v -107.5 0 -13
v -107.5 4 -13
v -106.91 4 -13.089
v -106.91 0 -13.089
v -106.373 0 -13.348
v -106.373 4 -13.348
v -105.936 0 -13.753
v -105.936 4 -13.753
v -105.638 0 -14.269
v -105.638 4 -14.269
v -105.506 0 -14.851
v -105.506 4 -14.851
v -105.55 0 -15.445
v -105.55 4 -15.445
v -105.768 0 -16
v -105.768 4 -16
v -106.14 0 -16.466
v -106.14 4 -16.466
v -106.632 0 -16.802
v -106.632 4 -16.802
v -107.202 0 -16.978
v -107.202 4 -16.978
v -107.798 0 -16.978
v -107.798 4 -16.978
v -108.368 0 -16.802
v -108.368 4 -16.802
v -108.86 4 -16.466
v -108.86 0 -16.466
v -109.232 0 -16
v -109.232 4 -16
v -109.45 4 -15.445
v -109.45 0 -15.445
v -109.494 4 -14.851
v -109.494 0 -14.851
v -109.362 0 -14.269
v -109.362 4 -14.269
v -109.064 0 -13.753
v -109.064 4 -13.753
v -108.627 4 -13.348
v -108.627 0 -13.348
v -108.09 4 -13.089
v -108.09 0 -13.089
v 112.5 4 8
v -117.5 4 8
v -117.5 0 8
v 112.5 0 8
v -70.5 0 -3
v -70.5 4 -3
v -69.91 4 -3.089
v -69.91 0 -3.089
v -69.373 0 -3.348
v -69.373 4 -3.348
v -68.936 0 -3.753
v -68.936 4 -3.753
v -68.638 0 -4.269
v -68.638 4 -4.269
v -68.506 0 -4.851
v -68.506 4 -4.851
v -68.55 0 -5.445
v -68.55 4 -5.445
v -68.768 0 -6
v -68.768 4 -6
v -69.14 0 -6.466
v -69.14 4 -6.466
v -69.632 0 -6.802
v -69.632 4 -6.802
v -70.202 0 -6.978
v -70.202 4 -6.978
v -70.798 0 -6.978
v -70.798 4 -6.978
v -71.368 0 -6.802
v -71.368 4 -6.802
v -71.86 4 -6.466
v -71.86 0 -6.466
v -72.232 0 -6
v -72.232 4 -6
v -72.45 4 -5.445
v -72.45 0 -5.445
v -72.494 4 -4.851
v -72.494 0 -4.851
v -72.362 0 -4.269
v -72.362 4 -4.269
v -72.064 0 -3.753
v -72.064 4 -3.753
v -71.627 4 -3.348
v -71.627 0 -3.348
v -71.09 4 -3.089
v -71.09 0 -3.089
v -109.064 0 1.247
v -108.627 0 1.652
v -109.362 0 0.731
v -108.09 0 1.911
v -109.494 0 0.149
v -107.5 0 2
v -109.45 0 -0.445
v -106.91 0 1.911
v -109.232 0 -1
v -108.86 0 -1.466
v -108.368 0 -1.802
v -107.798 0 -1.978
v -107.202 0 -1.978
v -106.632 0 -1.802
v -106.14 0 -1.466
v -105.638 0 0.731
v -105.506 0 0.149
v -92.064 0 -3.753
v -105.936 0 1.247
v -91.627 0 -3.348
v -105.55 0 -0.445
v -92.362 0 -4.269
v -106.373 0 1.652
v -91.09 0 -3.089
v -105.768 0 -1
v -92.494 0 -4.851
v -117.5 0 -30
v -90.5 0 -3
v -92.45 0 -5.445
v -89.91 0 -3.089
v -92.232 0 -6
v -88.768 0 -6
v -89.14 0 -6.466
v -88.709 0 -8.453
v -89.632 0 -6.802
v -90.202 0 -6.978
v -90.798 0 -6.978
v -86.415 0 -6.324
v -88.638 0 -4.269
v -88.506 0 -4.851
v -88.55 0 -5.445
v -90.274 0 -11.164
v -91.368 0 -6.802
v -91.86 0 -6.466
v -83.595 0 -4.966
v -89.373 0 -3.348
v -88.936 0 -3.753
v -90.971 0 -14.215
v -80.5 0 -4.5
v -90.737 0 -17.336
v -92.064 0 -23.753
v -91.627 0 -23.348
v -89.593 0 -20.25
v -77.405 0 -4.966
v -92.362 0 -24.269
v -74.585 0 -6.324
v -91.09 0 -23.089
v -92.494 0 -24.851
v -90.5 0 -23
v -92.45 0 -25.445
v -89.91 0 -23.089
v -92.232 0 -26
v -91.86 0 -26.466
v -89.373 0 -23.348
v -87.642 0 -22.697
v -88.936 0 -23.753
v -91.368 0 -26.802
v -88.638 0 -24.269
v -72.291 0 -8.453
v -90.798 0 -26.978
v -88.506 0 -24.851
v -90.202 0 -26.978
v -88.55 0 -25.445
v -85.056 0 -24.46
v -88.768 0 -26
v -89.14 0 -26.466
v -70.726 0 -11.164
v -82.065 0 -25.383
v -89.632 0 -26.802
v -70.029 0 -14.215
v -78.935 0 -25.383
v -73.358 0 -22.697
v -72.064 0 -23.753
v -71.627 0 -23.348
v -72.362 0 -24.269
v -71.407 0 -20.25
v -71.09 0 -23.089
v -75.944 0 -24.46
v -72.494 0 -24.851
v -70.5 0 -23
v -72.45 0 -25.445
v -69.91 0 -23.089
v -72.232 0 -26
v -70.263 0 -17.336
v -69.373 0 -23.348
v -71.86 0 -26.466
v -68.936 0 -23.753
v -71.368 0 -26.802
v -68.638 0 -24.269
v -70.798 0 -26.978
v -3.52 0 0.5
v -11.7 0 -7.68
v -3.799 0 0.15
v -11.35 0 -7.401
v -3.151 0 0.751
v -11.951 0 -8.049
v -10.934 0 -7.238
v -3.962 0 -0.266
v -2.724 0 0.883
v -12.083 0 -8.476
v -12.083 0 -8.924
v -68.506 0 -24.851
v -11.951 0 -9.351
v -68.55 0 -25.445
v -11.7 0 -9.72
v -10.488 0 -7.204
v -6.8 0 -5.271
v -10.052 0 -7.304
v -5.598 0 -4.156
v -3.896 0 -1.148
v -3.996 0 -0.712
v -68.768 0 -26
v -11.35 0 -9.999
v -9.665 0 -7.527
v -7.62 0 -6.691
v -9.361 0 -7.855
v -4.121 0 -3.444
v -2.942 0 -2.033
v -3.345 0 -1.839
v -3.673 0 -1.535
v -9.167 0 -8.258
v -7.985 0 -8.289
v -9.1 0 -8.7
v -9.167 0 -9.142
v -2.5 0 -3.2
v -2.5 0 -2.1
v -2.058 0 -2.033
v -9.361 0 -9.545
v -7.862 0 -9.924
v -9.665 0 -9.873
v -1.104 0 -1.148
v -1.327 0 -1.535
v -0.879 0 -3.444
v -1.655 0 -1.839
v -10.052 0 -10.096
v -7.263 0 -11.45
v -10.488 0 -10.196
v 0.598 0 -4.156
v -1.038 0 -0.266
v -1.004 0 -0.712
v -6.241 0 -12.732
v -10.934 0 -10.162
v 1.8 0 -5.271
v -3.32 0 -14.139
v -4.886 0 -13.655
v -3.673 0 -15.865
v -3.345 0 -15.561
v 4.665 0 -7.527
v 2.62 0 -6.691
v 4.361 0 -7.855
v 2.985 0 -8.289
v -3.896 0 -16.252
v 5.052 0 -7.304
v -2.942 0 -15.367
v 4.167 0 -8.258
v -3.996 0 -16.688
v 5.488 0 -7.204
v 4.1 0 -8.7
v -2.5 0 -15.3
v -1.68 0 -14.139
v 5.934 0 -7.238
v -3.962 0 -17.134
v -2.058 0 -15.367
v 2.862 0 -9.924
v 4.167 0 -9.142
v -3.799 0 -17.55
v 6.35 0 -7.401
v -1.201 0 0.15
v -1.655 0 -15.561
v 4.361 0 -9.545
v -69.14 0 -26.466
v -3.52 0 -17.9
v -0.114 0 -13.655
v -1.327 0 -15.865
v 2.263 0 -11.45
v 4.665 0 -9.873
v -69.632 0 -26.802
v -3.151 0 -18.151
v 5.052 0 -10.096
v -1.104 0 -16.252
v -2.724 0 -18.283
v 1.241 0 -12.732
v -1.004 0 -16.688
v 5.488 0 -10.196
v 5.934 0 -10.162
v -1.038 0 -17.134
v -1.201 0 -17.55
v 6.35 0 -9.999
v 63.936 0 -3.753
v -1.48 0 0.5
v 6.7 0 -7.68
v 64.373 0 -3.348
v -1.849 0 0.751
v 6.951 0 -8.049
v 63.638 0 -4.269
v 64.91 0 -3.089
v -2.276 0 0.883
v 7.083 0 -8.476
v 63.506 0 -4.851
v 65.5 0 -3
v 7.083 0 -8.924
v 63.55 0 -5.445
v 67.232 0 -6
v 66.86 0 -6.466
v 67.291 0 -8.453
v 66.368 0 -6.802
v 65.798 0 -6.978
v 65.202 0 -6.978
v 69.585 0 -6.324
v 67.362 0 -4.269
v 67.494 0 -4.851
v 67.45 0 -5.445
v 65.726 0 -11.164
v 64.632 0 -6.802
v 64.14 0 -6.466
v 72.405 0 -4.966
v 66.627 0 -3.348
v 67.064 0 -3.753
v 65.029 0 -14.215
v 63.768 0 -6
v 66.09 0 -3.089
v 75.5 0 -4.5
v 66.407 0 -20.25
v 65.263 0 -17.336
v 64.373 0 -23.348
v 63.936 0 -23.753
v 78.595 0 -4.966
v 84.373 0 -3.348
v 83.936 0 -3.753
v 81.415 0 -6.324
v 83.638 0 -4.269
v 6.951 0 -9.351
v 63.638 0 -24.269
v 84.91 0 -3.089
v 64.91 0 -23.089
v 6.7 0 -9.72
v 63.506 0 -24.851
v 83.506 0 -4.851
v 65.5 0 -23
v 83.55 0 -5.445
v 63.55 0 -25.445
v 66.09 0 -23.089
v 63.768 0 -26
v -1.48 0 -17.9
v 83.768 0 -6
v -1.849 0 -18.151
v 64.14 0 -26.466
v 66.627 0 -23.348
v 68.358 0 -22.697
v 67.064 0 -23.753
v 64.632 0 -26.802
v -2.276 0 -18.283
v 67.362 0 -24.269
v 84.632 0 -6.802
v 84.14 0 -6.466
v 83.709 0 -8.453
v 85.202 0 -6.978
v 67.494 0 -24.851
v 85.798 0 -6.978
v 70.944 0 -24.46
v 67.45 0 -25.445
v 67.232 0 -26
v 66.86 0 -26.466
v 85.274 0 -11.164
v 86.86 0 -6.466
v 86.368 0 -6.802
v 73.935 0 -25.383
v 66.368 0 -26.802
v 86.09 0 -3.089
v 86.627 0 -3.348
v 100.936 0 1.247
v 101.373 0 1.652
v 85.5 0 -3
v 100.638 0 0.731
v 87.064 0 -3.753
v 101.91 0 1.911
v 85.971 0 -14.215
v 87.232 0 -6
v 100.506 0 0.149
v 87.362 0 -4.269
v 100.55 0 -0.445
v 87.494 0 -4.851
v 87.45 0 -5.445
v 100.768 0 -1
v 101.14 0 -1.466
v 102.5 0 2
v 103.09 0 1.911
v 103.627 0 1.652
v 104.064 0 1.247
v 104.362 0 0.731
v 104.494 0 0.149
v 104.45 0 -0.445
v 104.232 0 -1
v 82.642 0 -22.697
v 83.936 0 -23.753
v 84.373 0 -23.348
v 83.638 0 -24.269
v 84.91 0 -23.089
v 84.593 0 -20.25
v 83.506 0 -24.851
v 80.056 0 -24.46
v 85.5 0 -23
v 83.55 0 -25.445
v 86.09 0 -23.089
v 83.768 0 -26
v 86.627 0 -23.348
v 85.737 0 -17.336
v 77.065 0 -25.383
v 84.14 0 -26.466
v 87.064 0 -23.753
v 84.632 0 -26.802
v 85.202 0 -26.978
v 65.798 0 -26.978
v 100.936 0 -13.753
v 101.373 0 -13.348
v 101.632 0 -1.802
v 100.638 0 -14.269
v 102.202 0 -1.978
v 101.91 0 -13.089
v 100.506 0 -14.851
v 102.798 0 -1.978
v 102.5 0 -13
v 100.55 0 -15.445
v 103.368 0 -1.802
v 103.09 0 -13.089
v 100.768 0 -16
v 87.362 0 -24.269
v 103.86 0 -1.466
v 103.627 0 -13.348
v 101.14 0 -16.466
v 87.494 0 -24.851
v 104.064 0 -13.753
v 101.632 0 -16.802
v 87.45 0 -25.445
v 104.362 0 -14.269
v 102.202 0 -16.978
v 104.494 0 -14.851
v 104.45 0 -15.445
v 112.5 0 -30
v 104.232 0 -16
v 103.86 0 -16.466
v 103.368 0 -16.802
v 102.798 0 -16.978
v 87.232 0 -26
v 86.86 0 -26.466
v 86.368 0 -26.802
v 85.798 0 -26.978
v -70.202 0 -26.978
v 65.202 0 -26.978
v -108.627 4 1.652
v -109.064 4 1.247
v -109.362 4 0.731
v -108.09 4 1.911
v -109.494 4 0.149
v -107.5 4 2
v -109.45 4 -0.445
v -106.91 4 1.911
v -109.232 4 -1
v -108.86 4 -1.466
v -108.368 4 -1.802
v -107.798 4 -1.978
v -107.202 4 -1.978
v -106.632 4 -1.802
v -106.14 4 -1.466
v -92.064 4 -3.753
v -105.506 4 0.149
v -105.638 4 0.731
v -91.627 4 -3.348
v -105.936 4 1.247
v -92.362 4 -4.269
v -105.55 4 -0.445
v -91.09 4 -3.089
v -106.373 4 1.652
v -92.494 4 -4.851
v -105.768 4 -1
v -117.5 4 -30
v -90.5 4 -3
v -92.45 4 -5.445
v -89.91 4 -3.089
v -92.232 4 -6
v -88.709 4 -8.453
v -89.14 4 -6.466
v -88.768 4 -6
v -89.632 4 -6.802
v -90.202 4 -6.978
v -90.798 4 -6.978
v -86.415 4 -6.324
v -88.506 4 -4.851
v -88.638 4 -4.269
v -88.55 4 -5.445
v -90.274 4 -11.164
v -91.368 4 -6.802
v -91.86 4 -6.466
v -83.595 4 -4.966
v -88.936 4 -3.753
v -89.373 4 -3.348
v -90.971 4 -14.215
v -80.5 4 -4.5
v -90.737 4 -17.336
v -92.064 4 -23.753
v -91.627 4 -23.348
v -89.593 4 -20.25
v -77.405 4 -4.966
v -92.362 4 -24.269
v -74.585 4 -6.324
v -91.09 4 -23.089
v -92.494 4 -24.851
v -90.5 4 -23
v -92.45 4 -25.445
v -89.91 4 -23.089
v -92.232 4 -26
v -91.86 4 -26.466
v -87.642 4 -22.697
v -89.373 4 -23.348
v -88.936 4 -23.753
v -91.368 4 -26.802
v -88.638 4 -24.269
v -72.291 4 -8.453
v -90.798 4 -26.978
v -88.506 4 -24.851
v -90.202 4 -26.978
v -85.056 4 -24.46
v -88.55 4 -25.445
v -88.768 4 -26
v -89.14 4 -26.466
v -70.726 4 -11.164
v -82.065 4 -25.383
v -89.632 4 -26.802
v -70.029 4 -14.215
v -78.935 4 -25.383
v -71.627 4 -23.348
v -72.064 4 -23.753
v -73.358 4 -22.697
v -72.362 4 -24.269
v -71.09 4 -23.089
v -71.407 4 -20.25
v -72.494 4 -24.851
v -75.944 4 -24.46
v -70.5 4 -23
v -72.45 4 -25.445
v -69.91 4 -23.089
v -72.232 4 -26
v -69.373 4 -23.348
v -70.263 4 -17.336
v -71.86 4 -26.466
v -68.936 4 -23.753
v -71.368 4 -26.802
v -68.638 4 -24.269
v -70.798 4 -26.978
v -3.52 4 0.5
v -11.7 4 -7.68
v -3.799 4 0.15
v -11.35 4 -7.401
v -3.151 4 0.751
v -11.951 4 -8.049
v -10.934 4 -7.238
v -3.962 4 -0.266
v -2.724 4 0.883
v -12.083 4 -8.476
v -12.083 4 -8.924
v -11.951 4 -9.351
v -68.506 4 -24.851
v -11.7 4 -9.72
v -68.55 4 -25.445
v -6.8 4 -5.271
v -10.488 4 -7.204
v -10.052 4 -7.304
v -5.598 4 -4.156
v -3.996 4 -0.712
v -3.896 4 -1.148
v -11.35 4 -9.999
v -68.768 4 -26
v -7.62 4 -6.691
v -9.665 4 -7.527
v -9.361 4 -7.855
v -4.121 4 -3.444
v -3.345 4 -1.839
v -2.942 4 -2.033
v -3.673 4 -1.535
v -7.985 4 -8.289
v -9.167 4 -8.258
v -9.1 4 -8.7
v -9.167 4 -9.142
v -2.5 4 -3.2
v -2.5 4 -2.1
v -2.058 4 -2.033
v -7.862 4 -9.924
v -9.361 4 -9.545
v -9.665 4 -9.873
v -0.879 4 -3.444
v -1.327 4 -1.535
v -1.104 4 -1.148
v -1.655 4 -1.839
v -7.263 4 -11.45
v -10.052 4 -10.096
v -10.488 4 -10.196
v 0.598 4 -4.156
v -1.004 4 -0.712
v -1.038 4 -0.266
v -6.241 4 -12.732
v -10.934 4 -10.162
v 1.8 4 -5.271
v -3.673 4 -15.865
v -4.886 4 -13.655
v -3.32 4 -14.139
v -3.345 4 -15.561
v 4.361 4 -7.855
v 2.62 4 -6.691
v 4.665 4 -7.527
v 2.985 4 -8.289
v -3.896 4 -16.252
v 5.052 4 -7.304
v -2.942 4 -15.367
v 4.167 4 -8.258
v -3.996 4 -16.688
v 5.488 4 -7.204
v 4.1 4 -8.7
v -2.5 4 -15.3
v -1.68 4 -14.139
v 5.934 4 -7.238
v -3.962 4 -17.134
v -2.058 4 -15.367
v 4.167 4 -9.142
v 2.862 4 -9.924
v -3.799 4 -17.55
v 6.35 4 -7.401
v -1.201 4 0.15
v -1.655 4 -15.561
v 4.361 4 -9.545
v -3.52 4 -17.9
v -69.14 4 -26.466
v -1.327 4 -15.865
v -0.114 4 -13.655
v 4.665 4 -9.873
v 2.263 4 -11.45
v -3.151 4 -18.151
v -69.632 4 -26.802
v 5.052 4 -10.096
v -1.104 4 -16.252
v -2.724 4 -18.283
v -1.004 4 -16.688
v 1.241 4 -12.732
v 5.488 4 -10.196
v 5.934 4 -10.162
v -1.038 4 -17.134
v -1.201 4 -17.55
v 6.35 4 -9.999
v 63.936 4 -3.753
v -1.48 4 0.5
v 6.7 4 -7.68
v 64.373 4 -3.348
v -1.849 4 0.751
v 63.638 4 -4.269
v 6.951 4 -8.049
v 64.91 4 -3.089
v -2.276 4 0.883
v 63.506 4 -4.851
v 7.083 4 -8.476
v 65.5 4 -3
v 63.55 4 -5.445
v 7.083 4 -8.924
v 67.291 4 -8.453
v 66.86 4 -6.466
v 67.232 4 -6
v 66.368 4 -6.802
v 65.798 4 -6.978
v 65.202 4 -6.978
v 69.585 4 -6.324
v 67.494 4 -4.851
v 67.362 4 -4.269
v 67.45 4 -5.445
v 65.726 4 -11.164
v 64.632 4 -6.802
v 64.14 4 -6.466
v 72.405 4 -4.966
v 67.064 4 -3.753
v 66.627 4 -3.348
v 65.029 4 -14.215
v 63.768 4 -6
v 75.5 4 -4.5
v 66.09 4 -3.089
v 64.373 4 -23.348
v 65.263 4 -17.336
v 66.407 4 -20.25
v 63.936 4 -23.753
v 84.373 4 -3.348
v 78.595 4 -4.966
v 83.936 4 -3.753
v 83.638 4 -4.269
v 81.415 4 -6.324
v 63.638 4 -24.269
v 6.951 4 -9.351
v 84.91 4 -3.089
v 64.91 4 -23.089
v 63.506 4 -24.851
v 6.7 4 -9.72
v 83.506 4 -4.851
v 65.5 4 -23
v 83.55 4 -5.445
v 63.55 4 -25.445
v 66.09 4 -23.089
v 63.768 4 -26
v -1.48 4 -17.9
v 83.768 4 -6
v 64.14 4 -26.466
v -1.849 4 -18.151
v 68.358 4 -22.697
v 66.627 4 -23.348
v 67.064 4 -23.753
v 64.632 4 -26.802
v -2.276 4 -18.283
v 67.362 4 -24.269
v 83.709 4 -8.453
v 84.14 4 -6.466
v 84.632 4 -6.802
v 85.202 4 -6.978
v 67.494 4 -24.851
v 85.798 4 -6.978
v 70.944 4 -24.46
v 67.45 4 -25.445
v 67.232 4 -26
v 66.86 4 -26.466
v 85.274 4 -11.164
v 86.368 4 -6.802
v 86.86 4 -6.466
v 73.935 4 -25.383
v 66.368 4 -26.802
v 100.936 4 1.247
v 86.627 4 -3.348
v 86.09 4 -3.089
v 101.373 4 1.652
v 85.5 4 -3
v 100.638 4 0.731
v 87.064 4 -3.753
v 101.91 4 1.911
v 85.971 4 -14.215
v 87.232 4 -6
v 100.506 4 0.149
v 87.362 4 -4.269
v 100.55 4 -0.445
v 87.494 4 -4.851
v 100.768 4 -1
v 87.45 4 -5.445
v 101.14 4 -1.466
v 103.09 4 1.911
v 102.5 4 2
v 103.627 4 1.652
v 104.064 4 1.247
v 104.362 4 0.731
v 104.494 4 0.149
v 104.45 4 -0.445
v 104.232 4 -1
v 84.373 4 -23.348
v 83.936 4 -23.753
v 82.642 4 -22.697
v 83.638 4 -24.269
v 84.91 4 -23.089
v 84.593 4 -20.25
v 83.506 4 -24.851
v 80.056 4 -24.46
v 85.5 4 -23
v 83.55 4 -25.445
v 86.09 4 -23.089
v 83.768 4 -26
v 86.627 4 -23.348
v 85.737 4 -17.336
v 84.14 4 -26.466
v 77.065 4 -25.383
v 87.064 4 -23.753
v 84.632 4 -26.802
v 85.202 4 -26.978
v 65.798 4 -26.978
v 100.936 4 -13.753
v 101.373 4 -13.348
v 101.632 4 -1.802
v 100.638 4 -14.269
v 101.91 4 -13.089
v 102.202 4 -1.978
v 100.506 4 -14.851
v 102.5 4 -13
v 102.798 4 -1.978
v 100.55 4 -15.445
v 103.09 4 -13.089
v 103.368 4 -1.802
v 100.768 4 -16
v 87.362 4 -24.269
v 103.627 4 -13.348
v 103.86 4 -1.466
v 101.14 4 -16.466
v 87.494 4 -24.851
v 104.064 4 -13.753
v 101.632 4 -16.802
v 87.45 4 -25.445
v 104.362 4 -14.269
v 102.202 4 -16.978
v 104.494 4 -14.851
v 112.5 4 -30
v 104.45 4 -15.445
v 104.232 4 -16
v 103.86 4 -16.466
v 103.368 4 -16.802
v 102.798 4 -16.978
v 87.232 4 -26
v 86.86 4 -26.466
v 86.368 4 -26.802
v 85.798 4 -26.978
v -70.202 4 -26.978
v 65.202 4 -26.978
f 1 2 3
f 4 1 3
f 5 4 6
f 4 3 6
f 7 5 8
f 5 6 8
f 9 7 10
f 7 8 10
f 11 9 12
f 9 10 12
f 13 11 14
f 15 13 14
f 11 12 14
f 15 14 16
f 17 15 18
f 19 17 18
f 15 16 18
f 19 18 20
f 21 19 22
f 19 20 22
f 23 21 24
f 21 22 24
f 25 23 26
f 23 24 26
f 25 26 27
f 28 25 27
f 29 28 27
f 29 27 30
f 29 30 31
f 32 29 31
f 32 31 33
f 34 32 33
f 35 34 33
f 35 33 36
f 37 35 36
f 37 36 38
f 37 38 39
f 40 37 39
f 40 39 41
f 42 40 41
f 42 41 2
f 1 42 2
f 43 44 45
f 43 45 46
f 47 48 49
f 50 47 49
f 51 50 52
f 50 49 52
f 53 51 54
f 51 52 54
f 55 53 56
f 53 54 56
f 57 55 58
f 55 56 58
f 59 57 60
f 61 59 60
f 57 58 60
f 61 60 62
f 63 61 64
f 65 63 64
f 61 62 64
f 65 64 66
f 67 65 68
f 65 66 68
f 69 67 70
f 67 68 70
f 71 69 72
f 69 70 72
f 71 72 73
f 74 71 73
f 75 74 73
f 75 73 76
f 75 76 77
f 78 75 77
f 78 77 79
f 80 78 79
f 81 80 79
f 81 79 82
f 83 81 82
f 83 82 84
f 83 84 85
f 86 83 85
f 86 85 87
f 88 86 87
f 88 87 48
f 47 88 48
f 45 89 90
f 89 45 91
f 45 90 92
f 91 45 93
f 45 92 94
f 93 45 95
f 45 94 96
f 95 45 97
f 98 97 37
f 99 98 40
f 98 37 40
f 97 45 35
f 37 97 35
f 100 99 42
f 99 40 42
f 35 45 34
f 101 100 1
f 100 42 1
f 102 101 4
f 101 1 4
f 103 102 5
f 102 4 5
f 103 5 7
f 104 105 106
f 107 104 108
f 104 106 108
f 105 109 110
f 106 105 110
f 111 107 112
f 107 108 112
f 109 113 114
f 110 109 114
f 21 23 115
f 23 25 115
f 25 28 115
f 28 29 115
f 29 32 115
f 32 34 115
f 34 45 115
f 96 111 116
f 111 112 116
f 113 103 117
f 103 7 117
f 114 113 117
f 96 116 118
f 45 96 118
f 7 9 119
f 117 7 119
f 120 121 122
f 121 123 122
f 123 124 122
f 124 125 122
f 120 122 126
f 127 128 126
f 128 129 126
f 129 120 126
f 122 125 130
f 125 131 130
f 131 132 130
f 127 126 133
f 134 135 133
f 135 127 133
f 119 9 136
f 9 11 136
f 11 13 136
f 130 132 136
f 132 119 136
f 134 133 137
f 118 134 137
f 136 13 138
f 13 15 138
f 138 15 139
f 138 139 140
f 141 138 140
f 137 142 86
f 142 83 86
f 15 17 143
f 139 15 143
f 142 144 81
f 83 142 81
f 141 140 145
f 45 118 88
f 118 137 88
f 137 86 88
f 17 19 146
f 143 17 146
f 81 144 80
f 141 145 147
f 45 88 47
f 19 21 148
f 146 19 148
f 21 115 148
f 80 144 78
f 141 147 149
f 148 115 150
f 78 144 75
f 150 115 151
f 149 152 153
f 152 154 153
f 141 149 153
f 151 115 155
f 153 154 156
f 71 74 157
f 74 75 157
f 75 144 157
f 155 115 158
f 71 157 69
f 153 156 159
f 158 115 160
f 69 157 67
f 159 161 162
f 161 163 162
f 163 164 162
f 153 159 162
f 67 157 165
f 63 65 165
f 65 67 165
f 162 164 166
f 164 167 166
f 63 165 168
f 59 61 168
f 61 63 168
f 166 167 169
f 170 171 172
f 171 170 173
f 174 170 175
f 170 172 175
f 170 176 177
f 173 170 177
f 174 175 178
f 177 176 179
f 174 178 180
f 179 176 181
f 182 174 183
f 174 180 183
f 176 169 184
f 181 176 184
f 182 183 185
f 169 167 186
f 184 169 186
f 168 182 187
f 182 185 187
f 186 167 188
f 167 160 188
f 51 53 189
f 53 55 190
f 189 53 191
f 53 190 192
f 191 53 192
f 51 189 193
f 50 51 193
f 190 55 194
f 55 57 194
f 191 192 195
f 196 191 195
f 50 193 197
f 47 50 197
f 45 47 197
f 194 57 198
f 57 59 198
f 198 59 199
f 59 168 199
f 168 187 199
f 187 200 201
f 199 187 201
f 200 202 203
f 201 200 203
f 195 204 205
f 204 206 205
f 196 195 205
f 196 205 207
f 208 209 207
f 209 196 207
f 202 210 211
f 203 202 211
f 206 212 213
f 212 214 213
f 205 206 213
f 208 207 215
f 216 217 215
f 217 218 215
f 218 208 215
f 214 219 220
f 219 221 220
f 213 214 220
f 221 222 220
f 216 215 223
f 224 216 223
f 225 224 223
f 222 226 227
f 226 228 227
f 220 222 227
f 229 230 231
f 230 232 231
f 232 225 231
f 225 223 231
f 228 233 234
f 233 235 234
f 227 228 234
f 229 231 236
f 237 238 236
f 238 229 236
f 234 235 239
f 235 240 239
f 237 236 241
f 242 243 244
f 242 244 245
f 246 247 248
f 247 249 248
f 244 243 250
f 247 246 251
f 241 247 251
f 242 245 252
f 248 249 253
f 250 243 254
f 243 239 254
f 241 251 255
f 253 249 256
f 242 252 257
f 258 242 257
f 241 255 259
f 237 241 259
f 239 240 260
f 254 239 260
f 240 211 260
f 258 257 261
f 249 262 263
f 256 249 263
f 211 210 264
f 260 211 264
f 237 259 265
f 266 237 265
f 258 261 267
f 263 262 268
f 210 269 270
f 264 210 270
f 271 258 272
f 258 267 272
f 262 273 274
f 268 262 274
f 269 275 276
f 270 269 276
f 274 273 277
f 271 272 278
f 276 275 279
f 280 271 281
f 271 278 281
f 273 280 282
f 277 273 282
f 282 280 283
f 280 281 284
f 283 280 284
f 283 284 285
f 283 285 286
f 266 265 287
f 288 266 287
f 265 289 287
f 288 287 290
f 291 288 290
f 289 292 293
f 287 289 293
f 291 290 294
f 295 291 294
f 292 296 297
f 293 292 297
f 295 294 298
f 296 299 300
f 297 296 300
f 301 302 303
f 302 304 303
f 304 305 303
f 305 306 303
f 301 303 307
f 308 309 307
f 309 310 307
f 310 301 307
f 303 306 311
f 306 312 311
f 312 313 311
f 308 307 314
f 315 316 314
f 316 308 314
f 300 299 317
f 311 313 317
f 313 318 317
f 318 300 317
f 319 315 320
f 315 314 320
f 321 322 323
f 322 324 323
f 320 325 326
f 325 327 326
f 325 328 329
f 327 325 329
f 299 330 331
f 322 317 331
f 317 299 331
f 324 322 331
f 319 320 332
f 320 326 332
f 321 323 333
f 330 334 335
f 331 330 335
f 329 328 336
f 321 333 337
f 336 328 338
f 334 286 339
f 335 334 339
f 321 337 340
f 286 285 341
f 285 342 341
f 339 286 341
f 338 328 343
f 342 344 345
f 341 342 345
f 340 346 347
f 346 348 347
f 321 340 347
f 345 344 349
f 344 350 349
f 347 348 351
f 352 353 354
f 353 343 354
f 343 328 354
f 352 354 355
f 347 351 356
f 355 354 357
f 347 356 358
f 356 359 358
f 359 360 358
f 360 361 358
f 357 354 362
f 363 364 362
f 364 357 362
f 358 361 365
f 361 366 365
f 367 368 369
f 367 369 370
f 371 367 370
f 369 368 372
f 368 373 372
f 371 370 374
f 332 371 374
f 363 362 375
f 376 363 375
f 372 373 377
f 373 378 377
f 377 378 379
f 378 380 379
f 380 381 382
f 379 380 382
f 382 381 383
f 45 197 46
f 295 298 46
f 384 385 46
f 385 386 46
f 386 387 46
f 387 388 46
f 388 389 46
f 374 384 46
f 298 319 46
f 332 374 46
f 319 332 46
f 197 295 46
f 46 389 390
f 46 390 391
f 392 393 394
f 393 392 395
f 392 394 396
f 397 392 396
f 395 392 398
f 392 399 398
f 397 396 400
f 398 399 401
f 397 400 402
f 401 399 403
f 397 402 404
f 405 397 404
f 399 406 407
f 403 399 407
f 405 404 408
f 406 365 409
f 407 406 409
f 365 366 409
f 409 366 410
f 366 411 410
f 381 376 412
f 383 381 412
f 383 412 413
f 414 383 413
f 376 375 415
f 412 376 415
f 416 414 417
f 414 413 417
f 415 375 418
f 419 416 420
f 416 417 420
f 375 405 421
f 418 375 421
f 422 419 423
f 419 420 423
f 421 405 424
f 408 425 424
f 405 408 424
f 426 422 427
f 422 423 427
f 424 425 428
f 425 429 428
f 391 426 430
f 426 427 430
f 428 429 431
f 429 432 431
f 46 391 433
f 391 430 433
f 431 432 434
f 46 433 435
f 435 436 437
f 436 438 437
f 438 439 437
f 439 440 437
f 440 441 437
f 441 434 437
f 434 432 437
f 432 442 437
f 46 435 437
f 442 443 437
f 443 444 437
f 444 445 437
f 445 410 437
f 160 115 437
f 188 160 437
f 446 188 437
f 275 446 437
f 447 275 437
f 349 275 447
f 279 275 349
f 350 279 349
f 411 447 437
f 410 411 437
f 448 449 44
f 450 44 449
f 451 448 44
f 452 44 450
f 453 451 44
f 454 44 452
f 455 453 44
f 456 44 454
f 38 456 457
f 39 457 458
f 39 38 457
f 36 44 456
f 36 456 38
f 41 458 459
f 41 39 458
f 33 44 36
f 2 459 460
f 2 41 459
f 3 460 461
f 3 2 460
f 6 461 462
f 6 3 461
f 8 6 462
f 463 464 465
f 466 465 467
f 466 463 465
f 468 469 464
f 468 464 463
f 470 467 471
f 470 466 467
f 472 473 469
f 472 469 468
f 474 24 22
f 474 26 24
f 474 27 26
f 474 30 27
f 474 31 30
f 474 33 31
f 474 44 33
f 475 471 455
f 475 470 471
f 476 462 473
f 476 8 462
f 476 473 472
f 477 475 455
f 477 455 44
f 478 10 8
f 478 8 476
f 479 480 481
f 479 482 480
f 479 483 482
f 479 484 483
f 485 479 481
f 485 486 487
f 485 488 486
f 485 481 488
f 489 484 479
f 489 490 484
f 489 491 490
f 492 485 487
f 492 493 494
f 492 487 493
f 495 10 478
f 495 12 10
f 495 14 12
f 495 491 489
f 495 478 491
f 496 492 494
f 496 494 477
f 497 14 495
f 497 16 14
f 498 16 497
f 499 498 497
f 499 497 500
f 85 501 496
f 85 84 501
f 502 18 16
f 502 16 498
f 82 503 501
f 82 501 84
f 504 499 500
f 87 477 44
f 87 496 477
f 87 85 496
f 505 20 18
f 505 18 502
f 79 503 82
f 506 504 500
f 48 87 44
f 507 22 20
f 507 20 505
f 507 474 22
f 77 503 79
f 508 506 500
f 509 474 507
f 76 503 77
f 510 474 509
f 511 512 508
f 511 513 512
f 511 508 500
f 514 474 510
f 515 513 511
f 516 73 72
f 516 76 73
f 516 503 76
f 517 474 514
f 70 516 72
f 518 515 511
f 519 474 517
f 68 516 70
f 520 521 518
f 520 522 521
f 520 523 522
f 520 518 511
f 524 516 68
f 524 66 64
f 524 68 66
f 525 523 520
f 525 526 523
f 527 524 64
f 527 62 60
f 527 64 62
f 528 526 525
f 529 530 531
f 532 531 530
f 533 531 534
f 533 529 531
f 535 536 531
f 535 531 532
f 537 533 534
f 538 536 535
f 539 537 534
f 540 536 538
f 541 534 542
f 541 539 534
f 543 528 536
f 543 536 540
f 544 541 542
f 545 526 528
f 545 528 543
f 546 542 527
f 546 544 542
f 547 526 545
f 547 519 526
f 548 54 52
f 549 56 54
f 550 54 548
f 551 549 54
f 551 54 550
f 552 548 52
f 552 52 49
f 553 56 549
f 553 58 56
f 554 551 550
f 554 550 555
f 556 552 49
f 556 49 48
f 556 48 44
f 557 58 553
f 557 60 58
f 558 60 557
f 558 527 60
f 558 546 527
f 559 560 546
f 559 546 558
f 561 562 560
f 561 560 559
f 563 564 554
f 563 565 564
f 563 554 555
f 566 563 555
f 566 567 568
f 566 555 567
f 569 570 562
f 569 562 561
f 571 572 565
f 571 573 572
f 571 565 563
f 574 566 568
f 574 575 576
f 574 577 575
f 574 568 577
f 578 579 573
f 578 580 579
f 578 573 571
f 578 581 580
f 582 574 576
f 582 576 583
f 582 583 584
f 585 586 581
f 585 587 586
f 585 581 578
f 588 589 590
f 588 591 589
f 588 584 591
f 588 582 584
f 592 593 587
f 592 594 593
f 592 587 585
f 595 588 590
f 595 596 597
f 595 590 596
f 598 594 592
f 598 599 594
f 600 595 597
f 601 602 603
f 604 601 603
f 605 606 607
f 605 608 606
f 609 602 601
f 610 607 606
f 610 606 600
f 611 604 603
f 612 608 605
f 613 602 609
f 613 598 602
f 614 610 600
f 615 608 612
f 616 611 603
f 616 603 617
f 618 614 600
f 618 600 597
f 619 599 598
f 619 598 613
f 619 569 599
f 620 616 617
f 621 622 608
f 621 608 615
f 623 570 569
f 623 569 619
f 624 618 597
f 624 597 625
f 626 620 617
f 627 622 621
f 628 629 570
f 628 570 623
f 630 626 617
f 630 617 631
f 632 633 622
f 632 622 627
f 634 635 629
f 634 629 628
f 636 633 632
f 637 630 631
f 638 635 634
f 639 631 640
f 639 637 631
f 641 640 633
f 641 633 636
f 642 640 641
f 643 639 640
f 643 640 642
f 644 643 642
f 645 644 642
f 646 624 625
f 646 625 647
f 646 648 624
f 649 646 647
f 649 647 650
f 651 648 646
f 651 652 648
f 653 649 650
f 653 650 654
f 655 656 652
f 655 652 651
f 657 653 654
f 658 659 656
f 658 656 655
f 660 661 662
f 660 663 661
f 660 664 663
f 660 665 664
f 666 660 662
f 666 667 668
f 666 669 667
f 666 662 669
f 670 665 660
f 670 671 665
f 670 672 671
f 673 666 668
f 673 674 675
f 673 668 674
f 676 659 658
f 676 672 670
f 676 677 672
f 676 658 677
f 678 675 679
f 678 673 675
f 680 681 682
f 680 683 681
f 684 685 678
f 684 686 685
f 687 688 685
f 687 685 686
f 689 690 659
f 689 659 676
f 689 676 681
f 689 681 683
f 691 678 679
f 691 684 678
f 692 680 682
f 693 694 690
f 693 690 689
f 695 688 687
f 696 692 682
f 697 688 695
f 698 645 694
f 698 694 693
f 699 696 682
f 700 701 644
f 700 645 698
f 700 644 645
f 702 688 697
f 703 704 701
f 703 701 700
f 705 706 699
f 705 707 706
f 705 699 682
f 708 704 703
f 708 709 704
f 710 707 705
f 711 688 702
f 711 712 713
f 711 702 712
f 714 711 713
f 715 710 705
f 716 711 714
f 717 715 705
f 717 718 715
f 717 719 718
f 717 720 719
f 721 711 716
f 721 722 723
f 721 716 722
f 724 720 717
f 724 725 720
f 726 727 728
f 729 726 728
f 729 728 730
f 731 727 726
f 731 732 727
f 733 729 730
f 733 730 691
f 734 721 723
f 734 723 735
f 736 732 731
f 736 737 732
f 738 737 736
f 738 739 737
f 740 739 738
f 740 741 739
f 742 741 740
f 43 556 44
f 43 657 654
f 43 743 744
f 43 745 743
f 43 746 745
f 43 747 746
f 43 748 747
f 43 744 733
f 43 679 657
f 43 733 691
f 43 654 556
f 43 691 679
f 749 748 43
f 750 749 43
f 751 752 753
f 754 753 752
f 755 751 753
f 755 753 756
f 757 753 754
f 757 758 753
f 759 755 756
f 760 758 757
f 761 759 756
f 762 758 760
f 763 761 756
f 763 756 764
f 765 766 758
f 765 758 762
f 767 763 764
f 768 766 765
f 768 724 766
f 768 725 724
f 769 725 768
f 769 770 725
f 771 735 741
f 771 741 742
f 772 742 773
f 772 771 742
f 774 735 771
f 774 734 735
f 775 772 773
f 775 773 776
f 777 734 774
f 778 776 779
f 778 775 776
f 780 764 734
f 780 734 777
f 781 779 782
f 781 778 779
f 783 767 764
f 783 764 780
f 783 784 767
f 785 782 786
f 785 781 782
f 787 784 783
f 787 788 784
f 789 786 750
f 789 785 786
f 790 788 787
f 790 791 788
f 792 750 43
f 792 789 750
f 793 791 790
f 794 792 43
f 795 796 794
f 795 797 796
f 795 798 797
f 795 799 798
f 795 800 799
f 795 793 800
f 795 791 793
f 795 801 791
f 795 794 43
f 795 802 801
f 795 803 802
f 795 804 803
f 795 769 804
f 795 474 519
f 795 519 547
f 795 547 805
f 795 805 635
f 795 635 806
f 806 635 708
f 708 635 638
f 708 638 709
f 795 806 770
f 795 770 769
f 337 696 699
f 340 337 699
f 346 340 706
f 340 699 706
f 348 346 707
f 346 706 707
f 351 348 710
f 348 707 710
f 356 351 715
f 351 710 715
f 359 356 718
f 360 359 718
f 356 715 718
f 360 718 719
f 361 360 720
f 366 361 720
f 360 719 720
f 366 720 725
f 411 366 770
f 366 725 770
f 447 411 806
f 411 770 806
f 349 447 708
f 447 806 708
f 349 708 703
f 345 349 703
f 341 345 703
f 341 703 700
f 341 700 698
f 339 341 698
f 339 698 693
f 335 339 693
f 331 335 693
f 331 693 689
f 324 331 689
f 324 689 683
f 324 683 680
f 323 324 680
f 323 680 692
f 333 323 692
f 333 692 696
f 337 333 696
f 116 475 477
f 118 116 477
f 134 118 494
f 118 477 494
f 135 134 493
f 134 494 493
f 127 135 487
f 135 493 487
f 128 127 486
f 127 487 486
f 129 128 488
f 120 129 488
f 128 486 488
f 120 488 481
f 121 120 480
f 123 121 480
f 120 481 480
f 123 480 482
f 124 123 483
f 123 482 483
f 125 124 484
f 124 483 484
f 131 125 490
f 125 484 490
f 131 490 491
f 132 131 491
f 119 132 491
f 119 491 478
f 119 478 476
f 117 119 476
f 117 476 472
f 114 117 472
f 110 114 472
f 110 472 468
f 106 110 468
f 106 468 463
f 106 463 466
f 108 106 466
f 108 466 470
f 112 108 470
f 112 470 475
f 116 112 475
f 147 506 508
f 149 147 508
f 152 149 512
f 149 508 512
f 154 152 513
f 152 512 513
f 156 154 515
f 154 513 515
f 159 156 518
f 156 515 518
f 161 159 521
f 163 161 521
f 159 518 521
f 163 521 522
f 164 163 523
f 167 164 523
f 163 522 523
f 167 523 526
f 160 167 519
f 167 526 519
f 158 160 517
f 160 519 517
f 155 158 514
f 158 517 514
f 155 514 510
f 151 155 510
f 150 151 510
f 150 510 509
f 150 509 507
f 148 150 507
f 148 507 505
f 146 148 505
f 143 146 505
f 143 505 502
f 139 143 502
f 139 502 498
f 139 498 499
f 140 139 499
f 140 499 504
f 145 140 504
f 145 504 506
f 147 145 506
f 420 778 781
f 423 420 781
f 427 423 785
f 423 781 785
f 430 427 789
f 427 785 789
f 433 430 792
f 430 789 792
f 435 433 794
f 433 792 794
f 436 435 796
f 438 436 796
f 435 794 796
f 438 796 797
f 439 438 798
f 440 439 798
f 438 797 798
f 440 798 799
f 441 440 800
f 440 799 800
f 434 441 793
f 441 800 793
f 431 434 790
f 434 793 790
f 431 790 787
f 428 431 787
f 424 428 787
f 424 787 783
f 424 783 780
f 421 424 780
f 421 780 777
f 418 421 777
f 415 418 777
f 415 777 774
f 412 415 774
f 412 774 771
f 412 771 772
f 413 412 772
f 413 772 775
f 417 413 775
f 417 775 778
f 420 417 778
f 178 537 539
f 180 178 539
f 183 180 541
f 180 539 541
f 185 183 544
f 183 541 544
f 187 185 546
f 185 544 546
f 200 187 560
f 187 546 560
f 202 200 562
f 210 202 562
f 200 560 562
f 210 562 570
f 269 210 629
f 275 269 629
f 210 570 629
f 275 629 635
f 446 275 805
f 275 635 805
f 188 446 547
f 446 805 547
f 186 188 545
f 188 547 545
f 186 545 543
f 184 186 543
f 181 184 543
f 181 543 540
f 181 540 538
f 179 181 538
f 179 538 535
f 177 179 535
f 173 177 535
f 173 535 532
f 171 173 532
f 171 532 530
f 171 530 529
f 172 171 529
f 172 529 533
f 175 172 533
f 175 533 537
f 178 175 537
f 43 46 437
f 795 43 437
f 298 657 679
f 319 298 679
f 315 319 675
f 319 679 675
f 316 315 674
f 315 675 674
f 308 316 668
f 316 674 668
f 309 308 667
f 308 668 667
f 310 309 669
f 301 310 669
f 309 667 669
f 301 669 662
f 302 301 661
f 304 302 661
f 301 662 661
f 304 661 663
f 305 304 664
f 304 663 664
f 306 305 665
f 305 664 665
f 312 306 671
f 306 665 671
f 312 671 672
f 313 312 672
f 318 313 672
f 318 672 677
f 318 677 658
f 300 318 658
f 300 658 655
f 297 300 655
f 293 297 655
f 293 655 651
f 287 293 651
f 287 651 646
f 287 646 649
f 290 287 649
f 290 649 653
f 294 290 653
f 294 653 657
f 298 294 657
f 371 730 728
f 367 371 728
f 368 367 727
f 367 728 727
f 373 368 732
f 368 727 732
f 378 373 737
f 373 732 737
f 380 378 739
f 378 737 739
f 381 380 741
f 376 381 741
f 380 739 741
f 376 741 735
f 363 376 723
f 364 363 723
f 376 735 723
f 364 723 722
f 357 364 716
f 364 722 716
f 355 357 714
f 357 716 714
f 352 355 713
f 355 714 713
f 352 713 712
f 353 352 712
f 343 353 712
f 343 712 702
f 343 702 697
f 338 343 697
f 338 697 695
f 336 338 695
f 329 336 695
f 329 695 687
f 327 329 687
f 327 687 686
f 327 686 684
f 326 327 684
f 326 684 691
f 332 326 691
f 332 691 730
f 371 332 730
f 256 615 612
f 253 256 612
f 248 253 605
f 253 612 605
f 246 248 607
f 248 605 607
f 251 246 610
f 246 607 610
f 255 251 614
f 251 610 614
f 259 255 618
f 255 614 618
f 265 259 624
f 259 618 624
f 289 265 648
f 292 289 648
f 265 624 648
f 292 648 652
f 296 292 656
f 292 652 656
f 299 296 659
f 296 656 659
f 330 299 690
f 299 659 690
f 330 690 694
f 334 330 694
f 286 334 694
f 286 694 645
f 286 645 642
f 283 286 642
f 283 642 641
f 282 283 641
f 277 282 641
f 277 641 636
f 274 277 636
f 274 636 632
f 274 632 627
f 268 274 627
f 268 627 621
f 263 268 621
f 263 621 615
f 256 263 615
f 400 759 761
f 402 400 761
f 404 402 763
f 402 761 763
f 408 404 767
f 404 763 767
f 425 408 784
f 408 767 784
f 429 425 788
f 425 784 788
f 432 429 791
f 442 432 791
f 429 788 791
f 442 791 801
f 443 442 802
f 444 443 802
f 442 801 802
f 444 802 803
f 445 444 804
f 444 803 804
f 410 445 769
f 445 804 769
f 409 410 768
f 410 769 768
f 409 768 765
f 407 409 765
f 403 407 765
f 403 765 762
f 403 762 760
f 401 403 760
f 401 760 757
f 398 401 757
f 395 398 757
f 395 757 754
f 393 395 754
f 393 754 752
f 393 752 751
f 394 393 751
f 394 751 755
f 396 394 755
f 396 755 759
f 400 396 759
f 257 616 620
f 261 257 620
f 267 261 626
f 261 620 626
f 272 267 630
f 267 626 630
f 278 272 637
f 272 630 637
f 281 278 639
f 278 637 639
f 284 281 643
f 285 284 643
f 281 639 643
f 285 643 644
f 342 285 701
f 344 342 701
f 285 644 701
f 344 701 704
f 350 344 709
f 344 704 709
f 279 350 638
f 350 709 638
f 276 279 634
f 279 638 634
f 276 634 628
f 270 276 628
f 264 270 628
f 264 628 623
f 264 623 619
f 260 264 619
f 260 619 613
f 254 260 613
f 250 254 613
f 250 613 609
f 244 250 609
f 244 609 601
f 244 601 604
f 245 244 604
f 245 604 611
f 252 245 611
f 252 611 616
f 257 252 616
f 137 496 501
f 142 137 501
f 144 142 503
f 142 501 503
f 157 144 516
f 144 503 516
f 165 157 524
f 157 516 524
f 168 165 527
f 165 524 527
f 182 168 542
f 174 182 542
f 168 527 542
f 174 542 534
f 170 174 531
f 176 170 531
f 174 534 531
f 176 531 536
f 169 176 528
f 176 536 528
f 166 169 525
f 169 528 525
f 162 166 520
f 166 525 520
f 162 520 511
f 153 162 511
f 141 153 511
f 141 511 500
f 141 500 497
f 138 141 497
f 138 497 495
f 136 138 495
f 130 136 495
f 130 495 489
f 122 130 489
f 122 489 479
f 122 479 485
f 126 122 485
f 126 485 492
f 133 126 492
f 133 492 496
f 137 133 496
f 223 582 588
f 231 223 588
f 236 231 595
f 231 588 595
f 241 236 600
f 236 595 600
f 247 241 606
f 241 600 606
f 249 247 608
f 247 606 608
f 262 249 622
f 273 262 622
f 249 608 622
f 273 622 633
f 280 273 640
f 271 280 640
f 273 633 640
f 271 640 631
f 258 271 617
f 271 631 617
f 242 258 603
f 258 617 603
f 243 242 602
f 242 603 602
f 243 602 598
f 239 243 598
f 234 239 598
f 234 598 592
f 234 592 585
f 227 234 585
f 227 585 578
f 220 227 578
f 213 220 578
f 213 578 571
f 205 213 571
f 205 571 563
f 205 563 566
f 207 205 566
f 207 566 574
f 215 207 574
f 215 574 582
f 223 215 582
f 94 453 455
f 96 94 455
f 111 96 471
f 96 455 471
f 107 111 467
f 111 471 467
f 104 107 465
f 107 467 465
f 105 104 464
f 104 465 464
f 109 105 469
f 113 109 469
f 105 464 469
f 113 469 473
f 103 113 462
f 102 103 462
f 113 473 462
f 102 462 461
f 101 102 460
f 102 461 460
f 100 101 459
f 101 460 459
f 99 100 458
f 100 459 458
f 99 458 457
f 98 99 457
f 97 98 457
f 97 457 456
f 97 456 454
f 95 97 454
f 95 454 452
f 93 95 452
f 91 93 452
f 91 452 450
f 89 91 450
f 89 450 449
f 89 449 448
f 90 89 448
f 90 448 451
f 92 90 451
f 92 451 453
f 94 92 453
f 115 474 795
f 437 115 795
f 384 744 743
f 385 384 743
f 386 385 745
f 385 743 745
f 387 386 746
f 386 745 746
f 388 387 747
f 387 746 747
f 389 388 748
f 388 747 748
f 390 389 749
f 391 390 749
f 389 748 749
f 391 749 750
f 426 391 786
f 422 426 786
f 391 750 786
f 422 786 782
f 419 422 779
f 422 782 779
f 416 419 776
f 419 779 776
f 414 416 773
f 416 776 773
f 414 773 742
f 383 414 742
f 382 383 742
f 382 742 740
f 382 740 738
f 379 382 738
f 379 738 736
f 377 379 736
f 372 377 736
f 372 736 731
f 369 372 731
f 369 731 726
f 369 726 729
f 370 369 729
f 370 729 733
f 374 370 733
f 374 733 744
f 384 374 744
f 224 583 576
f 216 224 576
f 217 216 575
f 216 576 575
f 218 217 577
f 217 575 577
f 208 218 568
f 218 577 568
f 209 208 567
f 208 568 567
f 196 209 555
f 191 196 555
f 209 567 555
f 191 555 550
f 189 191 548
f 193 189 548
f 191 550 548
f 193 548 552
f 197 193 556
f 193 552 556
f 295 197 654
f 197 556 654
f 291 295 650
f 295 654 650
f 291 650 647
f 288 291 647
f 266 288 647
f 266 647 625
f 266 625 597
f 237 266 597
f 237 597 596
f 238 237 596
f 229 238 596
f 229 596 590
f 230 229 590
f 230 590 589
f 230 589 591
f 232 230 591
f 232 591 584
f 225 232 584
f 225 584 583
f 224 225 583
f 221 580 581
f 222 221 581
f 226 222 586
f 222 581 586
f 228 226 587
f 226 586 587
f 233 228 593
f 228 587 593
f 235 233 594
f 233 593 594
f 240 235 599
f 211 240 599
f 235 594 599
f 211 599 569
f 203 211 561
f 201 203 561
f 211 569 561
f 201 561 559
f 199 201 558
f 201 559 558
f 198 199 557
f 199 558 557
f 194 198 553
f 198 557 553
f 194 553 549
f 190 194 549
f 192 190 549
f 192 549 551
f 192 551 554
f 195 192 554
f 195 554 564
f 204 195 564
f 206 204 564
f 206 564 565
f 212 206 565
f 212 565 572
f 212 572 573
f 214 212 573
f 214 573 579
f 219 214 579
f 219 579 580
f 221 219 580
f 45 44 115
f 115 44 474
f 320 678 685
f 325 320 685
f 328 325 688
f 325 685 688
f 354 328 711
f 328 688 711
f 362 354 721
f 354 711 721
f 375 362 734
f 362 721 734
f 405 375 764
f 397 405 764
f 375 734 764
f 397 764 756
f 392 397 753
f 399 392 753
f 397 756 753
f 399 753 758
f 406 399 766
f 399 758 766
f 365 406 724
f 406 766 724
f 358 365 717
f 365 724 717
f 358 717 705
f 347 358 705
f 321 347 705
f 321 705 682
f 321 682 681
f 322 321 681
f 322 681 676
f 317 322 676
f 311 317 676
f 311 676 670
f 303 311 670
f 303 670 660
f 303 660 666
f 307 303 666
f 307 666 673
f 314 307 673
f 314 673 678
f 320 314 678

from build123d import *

# Parameters (mm, degrees)
SKETCH1_W           = 225
SKETCH1_H           = 38
BOSS_EXTRUDE1_DEPTH = 4
CUT_EXTRUDE1_REACH  = 118.5
SKETCH2_R           = 10.5
SKETCH2_R_2         = 5.5
SKETCH10_W          = 5
SKETCH10_H          = 38
BOSS_EXTRUDE2_DEPTH = 4
SKETCH11_R          = 2
CUT_EXTRUDE2_DEPTH  = 27
SKETCH12_R          = 2
CUT_EXTRUDE3_DEPTH  = 27
SKETCH14_R          = 1.5
CUT_EXTRUDE4_DEPTH  = 10
CIRPATTERN1_COUNT   = 4


with BuildPart() as part:
    # Sketch1 → Boss-Extrude1 (new body)
    with BuildSketch(Plane(origin=(0, 0, 0), x_dir=(1, 0, 0), z_dir=(0, 1, 0))):
        with Locations((0, 11)):
            Rectangle(SKETCH1_W, SKETCH1_H)
    extrude(amount=BOSS_EXTRUDE1_DEPTH)

    # Sketch2 → Cut-Extrude1 (cut, up to next)
    with BuildSketch(Plane(origin=(0, 4, 0), x_dir=(1, 0, 0), z_dir=(0, 1, 0)), mode=Mode.PRIVATE) as cut_extrude1_sk1:
        with Locations(Location((75.5, 15, 0), (0, 0, 270))):
            Circle(SKETCH2_R)
    cut_extrude1_tool1 = extrude(cut_extrude1_sk1.sketch, amount=-CUT_EXTRUDE1_REACH, mode=Mode.PRIVATE) & part.part
    # Sketch2 → Cut-Extrude1 (cut, up to next)
    with BuildSketch(Plane(origin=(0, 4, 0), x_dir=(1, 0, 0), z_dir=(0, 1, 0)), mode=Mode.PRIVATE) as cut_extrude1_sk2:
        with Locations(Location((-80.5, 15, 0), (0, 0, 270))):
            Circle(SKETCH2_R)
    cut_extrude1_tool2 = extrude(cut_extrude1_sk2.sketch, amount=-CUT_EXTRUDE1_REACH, mode=Mode.PRIVATE) & part.part
    # Sketch2 → Cut-Extrude1 (cut, up to next)
    with BuildSketch(Plane(origin=(0, 4, 0), x_dir=(1, 0, 0), z_dir=(0, 1, 0)), mode=Mode.PRIVATE) as cut_extrude1_sk3:
        with Locations(Location((-2.5, 8.7, 0), (0, 0, 270))):
            Circle(SKETCH2_R_2)
    cut_extrude1_tool3 = extrude(cut_extrude1_sk3.sketch, amount=-CUT_EXTRUDE1_REACH, mode=Mode.PRIVATE) & part.part
    add(cut_extrude1_tool1.solids().sort_by_distance((75.5, 4, -15))[0], mode=Mode.SUBTRACT)
    add(cut_extrude1_tool2.solids().sort_by_distance((-80.5, 4, -15))[0], mode=Mode.SUBTRACT)
    add(cut_extrude1_tool3.solids().sort_by_distance((-2.5, 4, -8.7))[0], mode=Mode.SUBTRACT)

    # Sketch10 → Boss-Extrude2 (add)
    with BuildSketch(Plane(origin=(0, 4, 0), x_dir=(1, 0, 0), z_dir=(0, 1, 0))):
        with Locations((-115, 11)):
            Rectangle(SKETCH10_W, SKETCH10_H)
        with Locations((100, 11)):
            Rectangle(SKETCH10_W, SKETCH10_H)
    extrude(amount=-BOSS_EXTRUDE2_DEPTH)

    # Sketch11 → Cut-Extrude2 (cut)
    with BuildSketch(Plane(origin=(0, 4, 0), x_dir=(1, 0, 0), z_dir=(0, 1, 0))):
        with Locations(Location((102.5, 0, 0), (0, 0, 270))):
            Circle(SKETCH11_R)
        with Locations(Location((102.5, 15, 0), (0, 0, 270))):
            Circle(SKETCH11_R)
        with Locations(Location((-107.5, 15, 0), (0, 0, 270))):
            Circle(SKETCH11_R)
        with Locations(Location((-107.5, 0, 0), (0, 0, 270))):
            Circle(SKETCH11_R)
    extrude(amount=-CUT_EXTRUDE2_DEPTH, mode=Mode.SUBTRACT)

    # Sketch12 → Cut-Extrude3 (cut)
    with BuildSketch(Plane(origin=(0, 4, 0), x_dir=(1, 0, 0), z_dir=(0, 1, 0))):
        with Locations(Location((65.5, 5, 0), (0, 0, 270))):
            Circle(SKETCH12_R)
        with Locations(Location((85.5, 5, 0), (0, 0, 270))):
            Circle(SKETCH12_R)
        with Locations(Location((85.5, 25, 0), (0, 0, 270))):
            Circle(SKETCH12_R)
        with Locations(Location((65.5, 25, 0), (0, 0, 270))):
            Circle(SKETCH12_R)
        with Locations(Location((-70.5, 25, 0), (0, 0, 270))):
            Circle(SKETCH12_R)
        with Locations(Location((-90.5, 25, 0), (0, 0, 270))):
            Circle(SKETCH12_R)
        with Locations(Location((-90.5, 5, 0), (0, 0, 270))):
            Circle(SKETCH12_R)
        with Locations(Location((-70.5, 5, 0), (0, 0, 270))):
            Circle(SKETCH12_R)
    extrude(amount=-CUT_EXTRUDE3_DEPTH, mode=Mode.SUBTRACT)

    # Sketch14 → Cut-Extrude4 (cut)
    with BuildSketch(Plane(origin=(0, 4, 0), x_dir=(1, 0, 0), z_dir=(0, 1, 0))):
        with Locations(Location((-2.5, 16.8, 0), (0, 0, 270))):
            Circle(SKETCH14_R)
    cut_extrude4 = extrude(amount=-CUT_EXTRUDE4_DEPTH, mode=Mode.SUBTRACT)

    # CirPattern1: Cut-Extrude4 ×4 about axis
    cirpattern1_axis = Axis((-2.5, 0, -8.7), (0, 1, 0))
    for i in range(1, CIRPATTERN1_COUNT):
        add(cut_extrude4.rotate(cirpattern1_axis, i * 360 / CIRPATTERN1_COUNT), mode=Mode.SUBTRACT)


solid = part.part
